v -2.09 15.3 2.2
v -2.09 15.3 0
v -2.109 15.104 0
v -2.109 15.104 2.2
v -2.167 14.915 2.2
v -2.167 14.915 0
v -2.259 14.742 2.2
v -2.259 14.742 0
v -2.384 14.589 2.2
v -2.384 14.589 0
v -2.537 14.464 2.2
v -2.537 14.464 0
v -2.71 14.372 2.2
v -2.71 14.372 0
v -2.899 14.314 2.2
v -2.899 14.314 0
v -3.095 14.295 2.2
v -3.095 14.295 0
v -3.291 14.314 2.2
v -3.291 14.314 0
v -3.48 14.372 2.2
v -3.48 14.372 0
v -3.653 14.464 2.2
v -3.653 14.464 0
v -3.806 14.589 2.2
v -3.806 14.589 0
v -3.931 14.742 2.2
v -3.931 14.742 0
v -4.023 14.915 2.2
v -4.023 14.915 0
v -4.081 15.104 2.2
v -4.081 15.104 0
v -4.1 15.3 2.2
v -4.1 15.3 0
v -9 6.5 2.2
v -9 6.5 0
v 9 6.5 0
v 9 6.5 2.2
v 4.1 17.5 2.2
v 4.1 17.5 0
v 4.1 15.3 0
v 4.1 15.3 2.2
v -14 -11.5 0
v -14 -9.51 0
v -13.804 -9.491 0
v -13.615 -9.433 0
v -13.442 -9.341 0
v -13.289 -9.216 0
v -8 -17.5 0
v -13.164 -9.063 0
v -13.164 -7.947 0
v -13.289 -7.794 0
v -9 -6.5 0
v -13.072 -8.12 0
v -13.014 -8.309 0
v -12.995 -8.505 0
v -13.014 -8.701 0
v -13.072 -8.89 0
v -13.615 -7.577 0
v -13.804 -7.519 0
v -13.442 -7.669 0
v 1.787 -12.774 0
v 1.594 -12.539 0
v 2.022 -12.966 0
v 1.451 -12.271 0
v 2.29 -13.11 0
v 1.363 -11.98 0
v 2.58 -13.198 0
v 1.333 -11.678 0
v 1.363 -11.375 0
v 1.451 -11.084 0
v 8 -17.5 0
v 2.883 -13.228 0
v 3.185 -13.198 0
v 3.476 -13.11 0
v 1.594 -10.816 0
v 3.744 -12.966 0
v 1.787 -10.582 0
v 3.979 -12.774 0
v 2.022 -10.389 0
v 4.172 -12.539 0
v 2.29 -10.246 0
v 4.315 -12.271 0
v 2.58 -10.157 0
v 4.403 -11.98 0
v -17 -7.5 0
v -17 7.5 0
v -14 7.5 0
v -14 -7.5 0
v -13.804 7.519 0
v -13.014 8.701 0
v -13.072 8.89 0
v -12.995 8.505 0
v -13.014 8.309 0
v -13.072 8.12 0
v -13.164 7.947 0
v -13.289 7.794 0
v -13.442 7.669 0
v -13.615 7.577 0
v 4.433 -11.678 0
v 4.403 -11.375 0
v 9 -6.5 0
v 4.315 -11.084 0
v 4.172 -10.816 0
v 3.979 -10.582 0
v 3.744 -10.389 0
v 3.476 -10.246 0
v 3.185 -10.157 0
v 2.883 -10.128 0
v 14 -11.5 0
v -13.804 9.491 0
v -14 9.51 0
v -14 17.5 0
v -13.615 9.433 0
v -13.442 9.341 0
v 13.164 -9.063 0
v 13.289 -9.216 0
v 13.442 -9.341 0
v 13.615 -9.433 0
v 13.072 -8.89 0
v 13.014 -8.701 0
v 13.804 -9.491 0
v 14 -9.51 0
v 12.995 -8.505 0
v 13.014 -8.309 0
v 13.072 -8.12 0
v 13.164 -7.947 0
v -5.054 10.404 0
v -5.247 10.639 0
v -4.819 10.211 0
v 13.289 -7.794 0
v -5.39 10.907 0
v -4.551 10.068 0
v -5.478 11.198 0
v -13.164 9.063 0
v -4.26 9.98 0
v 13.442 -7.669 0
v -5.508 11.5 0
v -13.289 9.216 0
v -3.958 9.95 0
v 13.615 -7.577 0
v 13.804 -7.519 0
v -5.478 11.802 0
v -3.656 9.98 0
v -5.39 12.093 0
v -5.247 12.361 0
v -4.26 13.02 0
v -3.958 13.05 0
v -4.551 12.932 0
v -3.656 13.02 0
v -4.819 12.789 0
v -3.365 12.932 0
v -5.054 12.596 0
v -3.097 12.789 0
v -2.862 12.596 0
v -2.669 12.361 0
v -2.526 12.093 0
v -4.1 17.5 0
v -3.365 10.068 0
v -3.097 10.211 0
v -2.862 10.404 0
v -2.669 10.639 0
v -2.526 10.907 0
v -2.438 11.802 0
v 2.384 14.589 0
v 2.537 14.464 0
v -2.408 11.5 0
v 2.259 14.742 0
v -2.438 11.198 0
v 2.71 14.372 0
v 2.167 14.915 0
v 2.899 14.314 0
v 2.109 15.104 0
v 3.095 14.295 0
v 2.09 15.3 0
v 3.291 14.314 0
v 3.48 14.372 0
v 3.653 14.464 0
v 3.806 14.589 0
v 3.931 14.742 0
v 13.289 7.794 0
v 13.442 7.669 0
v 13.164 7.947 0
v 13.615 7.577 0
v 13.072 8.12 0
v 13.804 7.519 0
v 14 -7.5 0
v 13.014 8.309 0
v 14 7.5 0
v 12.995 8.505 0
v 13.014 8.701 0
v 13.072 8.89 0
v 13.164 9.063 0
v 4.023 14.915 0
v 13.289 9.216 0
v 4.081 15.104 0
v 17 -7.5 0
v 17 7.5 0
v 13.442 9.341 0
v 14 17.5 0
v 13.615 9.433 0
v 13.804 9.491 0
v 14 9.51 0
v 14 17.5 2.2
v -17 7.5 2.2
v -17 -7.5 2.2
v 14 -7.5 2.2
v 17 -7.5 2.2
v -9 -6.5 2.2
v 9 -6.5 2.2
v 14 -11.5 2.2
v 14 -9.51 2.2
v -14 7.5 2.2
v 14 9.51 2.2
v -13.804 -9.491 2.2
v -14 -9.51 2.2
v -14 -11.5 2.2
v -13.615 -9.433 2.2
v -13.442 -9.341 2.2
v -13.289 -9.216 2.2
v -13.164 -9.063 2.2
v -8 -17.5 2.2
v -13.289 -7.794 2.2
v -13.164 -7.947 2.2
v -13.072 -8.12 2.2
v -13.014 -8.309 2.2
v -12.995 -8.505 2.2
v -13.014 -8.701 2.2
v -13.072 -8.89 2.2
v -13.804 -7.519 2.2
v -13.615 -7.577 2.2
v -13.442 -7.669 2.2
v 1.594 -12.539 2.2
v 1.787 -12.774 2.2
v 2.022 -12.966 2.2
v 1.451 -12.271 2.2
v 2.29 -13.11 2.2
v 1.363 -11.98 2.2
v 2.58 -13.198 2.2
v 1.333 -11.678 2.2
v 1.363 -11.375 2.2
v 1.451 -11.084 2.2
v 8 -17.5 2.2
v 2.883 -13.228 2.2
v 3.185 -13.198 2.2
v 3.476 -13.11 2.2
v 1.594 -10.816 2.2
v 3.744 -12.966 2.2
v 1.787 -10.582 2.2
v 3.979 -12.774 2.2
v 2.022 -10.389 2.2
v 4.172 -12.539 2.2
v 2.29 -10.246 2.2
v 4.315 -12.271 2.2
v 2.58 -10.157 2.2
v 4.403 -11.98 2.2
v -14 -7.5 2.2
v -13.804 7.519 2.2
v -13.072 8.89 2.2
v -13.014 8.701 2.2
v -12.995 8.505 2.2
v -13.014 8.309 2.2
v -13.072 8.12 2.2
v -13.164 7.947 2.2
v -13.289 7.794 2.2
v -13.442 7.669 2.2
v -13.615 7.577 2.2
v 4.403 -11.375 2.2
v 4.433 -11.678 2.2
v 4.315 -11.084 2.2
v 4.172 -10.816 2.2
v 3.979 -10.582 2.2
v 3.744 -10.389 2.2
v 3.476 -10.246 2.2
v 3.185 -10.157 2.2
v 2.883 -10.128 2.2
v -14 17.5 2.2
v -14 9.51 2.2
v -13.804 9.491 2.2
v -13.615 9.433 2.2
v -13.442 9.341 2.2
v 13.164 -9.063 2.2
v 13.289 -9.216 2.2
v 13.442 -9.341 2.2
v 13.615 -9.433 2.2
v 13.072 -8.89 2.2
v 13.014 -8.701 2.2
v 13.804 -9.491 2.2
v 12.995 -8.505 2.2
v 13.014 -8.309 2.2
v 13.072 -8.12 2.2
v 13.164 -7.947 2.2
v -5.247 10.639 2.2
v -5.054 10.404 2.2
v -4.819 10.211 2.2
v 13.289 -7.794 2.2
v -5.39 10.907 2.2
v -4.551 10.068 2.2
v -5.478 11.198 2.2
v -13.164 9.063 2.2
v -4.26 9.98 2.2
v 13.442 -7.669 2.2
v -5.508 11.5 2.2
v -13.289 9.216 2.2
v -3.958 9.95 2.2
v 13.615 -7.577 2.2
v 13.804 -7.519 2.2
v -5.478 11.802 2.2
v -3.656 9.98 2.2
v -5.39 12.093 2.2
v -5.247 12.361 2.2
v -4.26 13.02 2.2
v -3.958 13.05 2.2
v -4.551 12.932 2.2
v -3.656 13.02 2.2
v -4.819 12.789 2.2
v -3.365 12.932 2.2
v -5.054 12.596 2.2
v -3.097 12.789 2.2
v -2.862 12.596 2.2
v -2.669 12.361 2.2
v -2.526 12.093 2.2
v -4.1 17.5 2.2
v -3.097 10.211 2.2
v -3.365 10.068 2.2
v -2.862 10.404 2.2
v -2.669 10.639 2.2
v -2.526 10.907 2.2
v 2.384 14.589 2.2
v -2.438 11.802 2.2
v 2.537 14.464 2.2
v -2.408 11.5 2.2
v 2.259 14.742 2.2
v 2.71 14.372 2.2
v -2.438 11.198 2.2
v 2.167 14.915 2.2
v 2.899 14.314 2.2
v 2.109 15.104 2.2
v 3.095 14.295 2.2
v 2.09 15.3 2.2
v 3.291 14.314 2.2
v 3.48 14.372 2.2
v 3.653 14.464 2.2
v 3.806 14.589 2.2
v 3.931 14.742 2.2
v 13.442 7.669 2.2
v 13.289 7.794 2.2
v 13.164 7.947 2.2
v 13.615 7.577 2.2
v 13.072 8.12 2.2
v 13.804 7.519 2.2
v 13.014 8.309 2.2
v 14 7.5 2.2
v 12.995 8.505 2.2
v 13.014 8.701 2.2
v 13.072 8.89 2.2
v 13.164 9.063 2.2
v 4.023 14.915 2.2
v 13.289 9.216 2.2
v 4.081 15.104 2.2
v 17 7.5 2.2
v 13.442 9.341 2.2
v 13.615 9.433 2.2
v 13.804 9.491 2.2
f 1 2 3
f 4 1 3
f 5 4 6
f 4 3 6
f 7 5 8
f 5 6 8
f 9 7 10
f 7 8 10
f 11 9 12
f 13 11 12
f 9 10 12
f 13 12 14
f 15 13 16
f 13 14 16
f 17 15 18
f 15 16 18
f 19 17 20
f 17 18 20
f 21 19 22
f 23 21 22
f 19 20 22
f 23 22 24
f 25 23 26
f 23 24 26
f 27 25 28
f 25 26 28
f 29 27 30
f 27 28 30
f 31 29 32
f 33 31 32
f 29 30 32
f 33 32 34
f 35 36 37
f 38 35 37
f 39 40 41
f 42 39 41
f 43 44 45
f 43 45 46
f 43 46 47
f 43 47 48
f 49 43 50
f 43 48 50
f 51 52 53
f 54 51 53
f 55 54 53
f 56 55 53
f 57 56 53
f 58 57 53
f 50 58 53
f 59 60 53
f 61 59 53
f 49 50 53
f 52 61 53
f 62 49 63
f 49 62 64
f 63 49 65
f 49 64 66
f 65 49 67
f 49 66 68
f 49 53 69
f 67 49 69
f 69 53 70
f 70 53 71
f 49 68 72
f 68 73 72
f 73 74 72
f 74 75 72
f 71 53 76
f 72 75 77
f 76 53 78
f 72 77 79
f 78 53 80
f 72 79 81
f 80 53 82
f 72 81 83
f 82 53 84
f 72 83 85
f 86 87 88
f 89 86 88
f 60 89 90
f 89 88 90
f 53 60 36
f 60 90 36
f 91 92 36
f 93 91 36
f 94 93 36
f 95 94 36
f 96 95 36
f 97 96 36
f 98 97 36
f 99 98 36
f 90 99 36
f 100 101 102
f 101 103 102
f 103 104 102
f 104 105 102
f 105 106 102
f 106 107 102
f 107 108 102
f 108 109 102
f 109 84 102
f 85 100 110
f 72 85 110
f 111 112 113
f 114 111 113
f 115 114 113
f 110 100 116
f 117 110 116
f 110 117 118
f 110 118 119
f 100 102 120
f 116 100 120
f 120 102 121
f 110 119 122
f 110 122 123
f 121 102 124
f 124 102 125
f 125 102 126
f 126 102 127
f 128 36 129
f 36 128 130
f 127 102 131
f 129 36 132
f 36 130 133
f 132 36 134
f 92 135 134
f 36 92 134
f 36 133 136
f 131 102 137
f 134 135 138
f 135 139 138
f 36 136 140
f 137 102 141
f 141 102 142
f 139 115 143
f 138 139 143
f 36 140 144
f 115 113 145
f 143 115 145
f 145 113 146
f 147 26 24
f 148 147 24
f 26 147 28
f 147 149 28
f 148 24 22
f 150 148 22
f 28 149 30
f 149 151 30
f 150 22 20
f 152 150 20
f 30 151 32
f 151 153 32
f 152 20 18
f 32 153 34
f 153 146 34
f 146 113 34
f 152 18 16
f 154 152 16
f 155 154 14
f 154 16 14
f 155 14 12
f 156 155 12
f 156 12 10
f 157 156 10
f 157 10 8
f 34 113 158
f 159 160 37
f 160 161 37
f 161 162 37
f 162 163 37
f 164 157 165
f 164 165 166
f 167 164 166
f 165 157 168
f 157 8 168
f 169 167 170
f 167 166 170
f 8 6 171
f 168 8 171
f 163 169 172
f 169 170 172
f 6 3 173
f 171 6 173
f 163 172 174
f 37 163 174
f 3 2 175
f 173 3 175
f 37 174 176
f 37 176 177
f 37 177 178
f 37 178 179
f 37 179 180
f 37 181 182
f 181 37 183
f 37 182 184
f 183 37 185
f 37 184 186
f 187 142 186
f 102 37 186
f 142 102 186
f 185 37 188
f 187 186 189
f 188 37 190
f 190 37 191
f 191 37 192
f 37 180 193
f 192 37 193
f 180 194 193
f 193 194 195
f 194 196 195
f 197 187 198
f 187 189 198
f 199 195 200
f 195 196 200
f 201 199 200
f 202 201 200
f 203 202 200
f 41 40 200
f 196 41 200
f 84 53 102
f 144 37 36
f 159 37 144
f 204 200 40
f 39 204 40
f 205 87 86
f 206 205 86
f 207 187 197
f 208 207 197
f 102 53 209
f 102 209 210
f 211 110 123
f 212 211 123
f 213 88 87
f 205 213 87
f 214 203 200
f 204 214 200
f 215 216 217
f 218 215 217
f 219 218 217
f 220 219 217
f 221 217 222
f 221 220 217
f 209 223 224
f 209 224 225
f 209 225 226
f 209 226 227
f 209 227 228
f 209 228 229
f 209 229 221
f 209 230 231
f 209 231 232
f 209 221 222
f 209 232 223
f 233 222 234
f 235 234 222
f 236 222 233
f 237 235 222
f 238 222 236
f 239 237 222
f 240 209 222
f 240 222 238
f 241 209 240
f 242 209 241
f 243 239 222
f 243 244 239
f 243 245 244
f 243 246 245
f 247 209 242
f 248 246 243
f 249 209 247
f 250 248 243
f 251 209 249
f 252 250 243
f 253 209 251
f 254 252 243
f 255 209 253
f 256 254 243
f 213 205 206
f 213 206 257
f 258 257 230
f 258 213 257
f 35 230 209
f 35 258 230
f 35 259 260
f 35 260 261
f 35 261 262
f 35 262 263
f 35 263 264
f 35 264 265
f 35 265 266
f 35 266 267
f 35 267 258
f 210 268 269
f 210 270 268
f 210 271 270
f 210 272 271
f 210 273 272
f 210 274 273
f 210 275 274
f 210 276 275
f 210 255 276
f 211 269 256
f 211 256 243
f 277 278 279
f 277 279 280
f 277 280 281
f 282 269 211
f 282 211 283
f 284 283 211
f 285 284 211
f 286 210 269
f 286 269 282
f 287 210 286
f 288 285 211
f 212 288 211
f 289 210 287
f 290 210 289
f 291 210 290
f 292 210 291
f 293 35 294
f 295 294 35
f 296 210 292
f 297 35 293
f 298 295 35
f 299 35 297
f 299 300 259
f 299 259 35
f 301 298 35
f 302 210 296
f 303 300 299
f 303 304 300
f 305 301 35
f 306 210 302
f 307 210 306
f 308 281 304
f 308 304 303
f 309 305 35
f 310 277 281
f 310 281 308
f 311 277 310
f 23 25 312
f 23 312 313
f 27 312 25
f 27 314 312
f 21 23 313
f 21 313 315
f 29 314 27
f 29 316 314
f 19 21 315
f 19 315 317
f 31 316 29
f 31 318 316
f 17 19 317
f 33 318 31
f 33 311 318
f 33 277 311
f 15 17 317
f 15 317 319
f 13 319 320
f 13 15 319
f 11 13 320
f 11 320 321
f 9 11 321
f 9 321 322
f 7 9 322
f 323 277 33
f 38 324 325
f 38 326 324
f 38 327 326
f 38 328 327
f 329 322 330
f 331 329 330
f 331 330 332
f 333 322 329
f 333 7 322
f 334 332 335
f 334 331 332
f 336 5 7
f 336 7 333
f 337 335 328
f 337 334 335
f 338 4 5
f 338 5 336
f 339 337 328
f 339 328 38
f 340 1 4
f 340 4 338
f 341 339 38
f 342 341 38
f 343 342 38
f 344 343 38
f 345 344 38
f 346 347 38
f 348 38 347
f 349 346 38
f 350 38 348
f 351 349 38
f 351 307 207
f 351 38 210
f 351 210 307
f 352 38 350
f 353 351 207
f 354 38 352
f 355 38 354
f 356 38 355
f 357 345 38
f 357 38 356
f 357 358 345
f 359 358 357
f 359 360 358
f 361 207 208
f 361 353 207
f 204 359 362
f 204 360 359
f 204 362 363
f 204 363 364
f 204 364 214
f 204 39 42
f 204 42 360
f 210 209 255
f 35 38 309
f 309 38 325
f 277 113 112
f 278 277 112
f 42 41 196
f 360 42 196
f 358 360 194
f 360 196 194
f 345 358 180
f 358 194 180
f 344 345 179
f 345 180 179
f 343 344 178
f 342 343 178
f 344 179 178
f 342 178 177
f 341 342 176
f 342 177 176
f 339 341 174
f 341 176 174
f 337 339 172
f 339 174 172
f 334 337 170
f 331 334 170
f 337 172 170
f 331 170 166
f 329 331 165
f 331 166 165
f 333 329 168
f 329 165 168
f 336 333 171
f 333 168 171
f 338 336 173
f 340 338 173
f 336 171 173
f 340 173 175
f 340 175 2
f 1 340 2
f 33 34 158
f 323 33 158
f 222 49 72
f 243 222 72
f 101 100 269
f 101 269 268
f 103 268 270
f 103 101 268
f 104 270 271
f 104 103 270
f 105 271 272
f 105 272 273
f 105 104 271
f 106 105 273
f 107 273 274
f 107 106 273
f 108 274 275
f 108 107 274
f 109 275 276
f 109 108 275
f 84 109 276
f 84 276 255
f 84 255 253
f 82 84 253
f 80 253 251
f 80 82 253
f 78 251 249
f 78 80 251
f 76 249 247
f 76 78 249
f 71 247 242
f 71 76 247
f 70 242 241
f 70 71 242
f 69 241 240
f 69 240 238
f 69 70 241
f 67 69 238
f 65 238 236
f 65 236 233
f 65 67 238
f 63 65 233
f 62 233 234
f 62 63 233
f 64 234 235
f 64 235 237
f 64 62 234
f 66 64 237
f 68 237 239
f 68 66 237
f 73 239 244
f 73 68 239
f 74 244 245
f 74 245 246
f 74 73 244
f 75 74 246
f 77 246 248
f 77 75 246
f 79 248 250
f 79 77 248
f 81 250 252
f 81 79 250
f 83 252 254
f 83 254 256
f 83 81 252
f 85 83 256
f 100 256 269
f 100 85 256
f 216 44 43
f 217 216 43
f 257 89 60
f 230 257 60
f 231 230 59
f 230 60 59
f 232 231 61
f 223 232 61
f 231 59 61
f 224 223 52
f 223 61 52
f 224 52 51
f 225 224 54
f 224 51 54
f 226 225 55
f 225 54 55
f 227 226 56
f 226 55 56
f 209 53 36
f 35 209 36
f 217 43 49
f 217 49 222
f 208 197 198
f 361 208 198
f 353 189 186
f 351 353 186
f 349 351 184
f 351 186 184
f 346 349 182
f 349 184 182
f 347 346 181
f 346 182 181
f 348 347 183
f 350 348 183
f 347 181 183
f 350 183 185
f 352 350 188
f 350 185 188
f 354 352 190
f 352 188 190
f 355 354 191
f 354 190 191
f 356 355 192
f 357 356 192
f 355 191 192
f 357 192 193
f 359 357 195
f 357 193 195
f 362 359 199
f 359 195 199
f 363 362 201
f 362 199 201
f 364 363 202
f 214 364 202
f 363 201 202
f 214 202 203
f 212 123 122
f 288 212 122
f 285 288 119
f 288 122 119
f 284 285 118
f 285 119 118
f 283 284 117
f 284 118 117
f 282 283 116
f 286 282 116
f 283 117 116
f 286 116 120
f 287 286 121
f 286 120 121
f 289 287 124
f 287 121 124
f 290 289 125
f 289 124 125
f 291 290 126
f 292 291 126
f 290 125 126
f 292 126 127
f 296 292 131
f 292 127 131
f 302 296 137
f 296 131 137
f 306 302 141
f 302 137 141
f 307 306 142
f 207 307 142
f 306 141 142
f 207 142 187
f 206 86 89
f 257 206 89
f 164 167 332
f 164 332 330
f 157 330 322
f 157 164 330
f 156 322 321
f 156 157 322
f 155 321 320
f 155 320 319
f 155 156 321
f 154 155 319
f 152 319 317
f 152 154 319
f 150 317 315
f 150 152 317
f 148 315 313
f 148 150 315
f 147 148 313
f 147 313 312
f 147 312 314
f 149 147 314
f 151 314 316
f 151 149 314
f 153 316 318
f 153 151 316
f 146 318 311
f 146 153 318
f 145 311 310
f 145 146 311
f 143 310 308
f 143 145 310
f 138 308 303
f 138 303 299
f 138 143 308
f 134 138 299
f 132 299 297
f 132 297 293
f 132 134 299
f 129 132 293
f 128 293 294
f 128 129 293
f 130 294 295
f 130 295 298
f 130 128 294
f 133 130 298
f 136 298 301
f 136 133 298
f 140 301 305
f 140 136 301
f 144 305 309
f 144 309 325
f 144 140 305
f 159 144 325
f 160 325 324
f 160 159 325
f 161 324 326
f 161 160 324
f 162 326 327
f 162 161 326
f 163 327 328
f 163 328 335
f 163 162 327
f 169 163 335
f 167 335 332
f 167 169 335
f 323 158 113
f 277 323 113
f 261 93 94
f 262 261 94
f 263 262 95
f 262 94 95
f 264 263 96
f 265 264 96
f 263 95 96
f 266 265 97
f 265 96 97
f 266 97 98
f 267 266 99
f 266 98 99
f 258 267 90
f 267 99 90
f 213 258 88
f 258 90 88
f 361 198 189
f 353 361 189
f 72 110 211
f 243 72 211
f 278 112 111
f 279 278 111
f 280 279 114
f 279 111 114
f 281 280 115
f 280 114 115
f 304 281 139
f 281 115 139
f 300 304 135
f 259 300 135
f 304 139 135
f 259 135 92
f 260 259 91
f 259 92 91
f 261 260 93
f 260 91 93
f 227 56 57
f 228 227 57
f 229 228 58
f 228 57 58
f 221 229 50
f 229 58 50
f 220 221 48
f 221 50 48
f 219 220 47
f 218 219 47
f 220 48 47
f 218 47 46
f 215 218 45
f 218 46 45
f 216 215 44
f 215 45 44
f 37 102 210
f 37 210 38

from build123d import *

# Parameters (mm, degrees)
SKETCH_1_R      = 1.55
SKETCH_1_W      = 18
SKETCH_1_H      = 13
EXTRUDE_1_DEPTH = 2.2
CHAMFER_1_SIZE  = 6


with BuildPart() as part:
    # 草图1 → 凸台-拉伸1 (new body)
    with BuildSketch(Plane.XY):
        with BuildLine():
            Line((-14, -17.5), (14, -17.5))
            Line((14, -17.5), (14, -9.51))
            ThreePointArc((14, -9.51), (12.995, -8.505), (14, -7.5))
            Line((14, -7.5), (17, -7.5))
            Line((17, -7.5), (17, 7.5))
            Line((17, 7.5), (14, 7.5))
            ThreePointArc((14, 7.5), (12.995, 8.505), (14, 9.51))
            Line((14, 9.51), (14, 17.5))
            Line((14, 17.5), (4.1, 17.5))
            Line((4.1, 17.5), (4.1, 15.3))
            ThreePointArc((4.1, 15.3), (3.095, 14.295), (2.09, 15.3))
            Line((2.09, 15.3), (-2.09, 15.3))
            ThreePointArc((-2.09, 15.3), (-3.095, 14.295), (-4.1, 15.3))
            Line((-4.1, 15.3), (-4.1, 17.5))
            Line((-4.1, 17.5), (-14, 17.5))
            Line((-14, 17.5), (-14, 9.51))
            ThreePointArc((-14, 9.51), (-13.289357685, 9.215642315), (-12.995, 8.505))
            ThreePointArc((-12.995, 8.505), (-13.289357685, 7.794357685), (-14, 7.5))
            Line((-14, 7.5), (-17, 7.5))
            Line((-17, 7.5), (-17, -7.5))
            Line((-17, -7.5), (-14, -7.5))
            ThreePointArc((-14, -7.5), (-13.289357685, -7.794357685), (-12.995, -8.505))
            ThreePointArc((-12.995, -8.505), (-13.289357685, -9.215642315), (-14, -9.51))
            Line((-14, -9.51), (-14, -17.5))
        make_face()
        with Locations((2.882843865, -11.677628522)):
            Circle(SKETCH_1_R, mode=Mode.SUBTRACT)
        Rectangle(SKETCH_1_W, SKETCH_1_H, mode=Mode.SUBTRACT)
        with Locations((-3.958028601, 11.5)):
            Circle(SKETCH_1_R, mode=Mode.SUBTRACT)
    extrude(amount=EXTRUDE_1_DEPTH)

    # 倒角1
    chamfer_1_edges = [part.edges().sort_by_distance(p)[0] for p in [
        (14, -17.5, 1.1),
        (-14, -17.5, 1.1),
    ]]
    chamfer(chamfer_1_edges, length=CHAMFER_1_SIZE)


solid = part.part
